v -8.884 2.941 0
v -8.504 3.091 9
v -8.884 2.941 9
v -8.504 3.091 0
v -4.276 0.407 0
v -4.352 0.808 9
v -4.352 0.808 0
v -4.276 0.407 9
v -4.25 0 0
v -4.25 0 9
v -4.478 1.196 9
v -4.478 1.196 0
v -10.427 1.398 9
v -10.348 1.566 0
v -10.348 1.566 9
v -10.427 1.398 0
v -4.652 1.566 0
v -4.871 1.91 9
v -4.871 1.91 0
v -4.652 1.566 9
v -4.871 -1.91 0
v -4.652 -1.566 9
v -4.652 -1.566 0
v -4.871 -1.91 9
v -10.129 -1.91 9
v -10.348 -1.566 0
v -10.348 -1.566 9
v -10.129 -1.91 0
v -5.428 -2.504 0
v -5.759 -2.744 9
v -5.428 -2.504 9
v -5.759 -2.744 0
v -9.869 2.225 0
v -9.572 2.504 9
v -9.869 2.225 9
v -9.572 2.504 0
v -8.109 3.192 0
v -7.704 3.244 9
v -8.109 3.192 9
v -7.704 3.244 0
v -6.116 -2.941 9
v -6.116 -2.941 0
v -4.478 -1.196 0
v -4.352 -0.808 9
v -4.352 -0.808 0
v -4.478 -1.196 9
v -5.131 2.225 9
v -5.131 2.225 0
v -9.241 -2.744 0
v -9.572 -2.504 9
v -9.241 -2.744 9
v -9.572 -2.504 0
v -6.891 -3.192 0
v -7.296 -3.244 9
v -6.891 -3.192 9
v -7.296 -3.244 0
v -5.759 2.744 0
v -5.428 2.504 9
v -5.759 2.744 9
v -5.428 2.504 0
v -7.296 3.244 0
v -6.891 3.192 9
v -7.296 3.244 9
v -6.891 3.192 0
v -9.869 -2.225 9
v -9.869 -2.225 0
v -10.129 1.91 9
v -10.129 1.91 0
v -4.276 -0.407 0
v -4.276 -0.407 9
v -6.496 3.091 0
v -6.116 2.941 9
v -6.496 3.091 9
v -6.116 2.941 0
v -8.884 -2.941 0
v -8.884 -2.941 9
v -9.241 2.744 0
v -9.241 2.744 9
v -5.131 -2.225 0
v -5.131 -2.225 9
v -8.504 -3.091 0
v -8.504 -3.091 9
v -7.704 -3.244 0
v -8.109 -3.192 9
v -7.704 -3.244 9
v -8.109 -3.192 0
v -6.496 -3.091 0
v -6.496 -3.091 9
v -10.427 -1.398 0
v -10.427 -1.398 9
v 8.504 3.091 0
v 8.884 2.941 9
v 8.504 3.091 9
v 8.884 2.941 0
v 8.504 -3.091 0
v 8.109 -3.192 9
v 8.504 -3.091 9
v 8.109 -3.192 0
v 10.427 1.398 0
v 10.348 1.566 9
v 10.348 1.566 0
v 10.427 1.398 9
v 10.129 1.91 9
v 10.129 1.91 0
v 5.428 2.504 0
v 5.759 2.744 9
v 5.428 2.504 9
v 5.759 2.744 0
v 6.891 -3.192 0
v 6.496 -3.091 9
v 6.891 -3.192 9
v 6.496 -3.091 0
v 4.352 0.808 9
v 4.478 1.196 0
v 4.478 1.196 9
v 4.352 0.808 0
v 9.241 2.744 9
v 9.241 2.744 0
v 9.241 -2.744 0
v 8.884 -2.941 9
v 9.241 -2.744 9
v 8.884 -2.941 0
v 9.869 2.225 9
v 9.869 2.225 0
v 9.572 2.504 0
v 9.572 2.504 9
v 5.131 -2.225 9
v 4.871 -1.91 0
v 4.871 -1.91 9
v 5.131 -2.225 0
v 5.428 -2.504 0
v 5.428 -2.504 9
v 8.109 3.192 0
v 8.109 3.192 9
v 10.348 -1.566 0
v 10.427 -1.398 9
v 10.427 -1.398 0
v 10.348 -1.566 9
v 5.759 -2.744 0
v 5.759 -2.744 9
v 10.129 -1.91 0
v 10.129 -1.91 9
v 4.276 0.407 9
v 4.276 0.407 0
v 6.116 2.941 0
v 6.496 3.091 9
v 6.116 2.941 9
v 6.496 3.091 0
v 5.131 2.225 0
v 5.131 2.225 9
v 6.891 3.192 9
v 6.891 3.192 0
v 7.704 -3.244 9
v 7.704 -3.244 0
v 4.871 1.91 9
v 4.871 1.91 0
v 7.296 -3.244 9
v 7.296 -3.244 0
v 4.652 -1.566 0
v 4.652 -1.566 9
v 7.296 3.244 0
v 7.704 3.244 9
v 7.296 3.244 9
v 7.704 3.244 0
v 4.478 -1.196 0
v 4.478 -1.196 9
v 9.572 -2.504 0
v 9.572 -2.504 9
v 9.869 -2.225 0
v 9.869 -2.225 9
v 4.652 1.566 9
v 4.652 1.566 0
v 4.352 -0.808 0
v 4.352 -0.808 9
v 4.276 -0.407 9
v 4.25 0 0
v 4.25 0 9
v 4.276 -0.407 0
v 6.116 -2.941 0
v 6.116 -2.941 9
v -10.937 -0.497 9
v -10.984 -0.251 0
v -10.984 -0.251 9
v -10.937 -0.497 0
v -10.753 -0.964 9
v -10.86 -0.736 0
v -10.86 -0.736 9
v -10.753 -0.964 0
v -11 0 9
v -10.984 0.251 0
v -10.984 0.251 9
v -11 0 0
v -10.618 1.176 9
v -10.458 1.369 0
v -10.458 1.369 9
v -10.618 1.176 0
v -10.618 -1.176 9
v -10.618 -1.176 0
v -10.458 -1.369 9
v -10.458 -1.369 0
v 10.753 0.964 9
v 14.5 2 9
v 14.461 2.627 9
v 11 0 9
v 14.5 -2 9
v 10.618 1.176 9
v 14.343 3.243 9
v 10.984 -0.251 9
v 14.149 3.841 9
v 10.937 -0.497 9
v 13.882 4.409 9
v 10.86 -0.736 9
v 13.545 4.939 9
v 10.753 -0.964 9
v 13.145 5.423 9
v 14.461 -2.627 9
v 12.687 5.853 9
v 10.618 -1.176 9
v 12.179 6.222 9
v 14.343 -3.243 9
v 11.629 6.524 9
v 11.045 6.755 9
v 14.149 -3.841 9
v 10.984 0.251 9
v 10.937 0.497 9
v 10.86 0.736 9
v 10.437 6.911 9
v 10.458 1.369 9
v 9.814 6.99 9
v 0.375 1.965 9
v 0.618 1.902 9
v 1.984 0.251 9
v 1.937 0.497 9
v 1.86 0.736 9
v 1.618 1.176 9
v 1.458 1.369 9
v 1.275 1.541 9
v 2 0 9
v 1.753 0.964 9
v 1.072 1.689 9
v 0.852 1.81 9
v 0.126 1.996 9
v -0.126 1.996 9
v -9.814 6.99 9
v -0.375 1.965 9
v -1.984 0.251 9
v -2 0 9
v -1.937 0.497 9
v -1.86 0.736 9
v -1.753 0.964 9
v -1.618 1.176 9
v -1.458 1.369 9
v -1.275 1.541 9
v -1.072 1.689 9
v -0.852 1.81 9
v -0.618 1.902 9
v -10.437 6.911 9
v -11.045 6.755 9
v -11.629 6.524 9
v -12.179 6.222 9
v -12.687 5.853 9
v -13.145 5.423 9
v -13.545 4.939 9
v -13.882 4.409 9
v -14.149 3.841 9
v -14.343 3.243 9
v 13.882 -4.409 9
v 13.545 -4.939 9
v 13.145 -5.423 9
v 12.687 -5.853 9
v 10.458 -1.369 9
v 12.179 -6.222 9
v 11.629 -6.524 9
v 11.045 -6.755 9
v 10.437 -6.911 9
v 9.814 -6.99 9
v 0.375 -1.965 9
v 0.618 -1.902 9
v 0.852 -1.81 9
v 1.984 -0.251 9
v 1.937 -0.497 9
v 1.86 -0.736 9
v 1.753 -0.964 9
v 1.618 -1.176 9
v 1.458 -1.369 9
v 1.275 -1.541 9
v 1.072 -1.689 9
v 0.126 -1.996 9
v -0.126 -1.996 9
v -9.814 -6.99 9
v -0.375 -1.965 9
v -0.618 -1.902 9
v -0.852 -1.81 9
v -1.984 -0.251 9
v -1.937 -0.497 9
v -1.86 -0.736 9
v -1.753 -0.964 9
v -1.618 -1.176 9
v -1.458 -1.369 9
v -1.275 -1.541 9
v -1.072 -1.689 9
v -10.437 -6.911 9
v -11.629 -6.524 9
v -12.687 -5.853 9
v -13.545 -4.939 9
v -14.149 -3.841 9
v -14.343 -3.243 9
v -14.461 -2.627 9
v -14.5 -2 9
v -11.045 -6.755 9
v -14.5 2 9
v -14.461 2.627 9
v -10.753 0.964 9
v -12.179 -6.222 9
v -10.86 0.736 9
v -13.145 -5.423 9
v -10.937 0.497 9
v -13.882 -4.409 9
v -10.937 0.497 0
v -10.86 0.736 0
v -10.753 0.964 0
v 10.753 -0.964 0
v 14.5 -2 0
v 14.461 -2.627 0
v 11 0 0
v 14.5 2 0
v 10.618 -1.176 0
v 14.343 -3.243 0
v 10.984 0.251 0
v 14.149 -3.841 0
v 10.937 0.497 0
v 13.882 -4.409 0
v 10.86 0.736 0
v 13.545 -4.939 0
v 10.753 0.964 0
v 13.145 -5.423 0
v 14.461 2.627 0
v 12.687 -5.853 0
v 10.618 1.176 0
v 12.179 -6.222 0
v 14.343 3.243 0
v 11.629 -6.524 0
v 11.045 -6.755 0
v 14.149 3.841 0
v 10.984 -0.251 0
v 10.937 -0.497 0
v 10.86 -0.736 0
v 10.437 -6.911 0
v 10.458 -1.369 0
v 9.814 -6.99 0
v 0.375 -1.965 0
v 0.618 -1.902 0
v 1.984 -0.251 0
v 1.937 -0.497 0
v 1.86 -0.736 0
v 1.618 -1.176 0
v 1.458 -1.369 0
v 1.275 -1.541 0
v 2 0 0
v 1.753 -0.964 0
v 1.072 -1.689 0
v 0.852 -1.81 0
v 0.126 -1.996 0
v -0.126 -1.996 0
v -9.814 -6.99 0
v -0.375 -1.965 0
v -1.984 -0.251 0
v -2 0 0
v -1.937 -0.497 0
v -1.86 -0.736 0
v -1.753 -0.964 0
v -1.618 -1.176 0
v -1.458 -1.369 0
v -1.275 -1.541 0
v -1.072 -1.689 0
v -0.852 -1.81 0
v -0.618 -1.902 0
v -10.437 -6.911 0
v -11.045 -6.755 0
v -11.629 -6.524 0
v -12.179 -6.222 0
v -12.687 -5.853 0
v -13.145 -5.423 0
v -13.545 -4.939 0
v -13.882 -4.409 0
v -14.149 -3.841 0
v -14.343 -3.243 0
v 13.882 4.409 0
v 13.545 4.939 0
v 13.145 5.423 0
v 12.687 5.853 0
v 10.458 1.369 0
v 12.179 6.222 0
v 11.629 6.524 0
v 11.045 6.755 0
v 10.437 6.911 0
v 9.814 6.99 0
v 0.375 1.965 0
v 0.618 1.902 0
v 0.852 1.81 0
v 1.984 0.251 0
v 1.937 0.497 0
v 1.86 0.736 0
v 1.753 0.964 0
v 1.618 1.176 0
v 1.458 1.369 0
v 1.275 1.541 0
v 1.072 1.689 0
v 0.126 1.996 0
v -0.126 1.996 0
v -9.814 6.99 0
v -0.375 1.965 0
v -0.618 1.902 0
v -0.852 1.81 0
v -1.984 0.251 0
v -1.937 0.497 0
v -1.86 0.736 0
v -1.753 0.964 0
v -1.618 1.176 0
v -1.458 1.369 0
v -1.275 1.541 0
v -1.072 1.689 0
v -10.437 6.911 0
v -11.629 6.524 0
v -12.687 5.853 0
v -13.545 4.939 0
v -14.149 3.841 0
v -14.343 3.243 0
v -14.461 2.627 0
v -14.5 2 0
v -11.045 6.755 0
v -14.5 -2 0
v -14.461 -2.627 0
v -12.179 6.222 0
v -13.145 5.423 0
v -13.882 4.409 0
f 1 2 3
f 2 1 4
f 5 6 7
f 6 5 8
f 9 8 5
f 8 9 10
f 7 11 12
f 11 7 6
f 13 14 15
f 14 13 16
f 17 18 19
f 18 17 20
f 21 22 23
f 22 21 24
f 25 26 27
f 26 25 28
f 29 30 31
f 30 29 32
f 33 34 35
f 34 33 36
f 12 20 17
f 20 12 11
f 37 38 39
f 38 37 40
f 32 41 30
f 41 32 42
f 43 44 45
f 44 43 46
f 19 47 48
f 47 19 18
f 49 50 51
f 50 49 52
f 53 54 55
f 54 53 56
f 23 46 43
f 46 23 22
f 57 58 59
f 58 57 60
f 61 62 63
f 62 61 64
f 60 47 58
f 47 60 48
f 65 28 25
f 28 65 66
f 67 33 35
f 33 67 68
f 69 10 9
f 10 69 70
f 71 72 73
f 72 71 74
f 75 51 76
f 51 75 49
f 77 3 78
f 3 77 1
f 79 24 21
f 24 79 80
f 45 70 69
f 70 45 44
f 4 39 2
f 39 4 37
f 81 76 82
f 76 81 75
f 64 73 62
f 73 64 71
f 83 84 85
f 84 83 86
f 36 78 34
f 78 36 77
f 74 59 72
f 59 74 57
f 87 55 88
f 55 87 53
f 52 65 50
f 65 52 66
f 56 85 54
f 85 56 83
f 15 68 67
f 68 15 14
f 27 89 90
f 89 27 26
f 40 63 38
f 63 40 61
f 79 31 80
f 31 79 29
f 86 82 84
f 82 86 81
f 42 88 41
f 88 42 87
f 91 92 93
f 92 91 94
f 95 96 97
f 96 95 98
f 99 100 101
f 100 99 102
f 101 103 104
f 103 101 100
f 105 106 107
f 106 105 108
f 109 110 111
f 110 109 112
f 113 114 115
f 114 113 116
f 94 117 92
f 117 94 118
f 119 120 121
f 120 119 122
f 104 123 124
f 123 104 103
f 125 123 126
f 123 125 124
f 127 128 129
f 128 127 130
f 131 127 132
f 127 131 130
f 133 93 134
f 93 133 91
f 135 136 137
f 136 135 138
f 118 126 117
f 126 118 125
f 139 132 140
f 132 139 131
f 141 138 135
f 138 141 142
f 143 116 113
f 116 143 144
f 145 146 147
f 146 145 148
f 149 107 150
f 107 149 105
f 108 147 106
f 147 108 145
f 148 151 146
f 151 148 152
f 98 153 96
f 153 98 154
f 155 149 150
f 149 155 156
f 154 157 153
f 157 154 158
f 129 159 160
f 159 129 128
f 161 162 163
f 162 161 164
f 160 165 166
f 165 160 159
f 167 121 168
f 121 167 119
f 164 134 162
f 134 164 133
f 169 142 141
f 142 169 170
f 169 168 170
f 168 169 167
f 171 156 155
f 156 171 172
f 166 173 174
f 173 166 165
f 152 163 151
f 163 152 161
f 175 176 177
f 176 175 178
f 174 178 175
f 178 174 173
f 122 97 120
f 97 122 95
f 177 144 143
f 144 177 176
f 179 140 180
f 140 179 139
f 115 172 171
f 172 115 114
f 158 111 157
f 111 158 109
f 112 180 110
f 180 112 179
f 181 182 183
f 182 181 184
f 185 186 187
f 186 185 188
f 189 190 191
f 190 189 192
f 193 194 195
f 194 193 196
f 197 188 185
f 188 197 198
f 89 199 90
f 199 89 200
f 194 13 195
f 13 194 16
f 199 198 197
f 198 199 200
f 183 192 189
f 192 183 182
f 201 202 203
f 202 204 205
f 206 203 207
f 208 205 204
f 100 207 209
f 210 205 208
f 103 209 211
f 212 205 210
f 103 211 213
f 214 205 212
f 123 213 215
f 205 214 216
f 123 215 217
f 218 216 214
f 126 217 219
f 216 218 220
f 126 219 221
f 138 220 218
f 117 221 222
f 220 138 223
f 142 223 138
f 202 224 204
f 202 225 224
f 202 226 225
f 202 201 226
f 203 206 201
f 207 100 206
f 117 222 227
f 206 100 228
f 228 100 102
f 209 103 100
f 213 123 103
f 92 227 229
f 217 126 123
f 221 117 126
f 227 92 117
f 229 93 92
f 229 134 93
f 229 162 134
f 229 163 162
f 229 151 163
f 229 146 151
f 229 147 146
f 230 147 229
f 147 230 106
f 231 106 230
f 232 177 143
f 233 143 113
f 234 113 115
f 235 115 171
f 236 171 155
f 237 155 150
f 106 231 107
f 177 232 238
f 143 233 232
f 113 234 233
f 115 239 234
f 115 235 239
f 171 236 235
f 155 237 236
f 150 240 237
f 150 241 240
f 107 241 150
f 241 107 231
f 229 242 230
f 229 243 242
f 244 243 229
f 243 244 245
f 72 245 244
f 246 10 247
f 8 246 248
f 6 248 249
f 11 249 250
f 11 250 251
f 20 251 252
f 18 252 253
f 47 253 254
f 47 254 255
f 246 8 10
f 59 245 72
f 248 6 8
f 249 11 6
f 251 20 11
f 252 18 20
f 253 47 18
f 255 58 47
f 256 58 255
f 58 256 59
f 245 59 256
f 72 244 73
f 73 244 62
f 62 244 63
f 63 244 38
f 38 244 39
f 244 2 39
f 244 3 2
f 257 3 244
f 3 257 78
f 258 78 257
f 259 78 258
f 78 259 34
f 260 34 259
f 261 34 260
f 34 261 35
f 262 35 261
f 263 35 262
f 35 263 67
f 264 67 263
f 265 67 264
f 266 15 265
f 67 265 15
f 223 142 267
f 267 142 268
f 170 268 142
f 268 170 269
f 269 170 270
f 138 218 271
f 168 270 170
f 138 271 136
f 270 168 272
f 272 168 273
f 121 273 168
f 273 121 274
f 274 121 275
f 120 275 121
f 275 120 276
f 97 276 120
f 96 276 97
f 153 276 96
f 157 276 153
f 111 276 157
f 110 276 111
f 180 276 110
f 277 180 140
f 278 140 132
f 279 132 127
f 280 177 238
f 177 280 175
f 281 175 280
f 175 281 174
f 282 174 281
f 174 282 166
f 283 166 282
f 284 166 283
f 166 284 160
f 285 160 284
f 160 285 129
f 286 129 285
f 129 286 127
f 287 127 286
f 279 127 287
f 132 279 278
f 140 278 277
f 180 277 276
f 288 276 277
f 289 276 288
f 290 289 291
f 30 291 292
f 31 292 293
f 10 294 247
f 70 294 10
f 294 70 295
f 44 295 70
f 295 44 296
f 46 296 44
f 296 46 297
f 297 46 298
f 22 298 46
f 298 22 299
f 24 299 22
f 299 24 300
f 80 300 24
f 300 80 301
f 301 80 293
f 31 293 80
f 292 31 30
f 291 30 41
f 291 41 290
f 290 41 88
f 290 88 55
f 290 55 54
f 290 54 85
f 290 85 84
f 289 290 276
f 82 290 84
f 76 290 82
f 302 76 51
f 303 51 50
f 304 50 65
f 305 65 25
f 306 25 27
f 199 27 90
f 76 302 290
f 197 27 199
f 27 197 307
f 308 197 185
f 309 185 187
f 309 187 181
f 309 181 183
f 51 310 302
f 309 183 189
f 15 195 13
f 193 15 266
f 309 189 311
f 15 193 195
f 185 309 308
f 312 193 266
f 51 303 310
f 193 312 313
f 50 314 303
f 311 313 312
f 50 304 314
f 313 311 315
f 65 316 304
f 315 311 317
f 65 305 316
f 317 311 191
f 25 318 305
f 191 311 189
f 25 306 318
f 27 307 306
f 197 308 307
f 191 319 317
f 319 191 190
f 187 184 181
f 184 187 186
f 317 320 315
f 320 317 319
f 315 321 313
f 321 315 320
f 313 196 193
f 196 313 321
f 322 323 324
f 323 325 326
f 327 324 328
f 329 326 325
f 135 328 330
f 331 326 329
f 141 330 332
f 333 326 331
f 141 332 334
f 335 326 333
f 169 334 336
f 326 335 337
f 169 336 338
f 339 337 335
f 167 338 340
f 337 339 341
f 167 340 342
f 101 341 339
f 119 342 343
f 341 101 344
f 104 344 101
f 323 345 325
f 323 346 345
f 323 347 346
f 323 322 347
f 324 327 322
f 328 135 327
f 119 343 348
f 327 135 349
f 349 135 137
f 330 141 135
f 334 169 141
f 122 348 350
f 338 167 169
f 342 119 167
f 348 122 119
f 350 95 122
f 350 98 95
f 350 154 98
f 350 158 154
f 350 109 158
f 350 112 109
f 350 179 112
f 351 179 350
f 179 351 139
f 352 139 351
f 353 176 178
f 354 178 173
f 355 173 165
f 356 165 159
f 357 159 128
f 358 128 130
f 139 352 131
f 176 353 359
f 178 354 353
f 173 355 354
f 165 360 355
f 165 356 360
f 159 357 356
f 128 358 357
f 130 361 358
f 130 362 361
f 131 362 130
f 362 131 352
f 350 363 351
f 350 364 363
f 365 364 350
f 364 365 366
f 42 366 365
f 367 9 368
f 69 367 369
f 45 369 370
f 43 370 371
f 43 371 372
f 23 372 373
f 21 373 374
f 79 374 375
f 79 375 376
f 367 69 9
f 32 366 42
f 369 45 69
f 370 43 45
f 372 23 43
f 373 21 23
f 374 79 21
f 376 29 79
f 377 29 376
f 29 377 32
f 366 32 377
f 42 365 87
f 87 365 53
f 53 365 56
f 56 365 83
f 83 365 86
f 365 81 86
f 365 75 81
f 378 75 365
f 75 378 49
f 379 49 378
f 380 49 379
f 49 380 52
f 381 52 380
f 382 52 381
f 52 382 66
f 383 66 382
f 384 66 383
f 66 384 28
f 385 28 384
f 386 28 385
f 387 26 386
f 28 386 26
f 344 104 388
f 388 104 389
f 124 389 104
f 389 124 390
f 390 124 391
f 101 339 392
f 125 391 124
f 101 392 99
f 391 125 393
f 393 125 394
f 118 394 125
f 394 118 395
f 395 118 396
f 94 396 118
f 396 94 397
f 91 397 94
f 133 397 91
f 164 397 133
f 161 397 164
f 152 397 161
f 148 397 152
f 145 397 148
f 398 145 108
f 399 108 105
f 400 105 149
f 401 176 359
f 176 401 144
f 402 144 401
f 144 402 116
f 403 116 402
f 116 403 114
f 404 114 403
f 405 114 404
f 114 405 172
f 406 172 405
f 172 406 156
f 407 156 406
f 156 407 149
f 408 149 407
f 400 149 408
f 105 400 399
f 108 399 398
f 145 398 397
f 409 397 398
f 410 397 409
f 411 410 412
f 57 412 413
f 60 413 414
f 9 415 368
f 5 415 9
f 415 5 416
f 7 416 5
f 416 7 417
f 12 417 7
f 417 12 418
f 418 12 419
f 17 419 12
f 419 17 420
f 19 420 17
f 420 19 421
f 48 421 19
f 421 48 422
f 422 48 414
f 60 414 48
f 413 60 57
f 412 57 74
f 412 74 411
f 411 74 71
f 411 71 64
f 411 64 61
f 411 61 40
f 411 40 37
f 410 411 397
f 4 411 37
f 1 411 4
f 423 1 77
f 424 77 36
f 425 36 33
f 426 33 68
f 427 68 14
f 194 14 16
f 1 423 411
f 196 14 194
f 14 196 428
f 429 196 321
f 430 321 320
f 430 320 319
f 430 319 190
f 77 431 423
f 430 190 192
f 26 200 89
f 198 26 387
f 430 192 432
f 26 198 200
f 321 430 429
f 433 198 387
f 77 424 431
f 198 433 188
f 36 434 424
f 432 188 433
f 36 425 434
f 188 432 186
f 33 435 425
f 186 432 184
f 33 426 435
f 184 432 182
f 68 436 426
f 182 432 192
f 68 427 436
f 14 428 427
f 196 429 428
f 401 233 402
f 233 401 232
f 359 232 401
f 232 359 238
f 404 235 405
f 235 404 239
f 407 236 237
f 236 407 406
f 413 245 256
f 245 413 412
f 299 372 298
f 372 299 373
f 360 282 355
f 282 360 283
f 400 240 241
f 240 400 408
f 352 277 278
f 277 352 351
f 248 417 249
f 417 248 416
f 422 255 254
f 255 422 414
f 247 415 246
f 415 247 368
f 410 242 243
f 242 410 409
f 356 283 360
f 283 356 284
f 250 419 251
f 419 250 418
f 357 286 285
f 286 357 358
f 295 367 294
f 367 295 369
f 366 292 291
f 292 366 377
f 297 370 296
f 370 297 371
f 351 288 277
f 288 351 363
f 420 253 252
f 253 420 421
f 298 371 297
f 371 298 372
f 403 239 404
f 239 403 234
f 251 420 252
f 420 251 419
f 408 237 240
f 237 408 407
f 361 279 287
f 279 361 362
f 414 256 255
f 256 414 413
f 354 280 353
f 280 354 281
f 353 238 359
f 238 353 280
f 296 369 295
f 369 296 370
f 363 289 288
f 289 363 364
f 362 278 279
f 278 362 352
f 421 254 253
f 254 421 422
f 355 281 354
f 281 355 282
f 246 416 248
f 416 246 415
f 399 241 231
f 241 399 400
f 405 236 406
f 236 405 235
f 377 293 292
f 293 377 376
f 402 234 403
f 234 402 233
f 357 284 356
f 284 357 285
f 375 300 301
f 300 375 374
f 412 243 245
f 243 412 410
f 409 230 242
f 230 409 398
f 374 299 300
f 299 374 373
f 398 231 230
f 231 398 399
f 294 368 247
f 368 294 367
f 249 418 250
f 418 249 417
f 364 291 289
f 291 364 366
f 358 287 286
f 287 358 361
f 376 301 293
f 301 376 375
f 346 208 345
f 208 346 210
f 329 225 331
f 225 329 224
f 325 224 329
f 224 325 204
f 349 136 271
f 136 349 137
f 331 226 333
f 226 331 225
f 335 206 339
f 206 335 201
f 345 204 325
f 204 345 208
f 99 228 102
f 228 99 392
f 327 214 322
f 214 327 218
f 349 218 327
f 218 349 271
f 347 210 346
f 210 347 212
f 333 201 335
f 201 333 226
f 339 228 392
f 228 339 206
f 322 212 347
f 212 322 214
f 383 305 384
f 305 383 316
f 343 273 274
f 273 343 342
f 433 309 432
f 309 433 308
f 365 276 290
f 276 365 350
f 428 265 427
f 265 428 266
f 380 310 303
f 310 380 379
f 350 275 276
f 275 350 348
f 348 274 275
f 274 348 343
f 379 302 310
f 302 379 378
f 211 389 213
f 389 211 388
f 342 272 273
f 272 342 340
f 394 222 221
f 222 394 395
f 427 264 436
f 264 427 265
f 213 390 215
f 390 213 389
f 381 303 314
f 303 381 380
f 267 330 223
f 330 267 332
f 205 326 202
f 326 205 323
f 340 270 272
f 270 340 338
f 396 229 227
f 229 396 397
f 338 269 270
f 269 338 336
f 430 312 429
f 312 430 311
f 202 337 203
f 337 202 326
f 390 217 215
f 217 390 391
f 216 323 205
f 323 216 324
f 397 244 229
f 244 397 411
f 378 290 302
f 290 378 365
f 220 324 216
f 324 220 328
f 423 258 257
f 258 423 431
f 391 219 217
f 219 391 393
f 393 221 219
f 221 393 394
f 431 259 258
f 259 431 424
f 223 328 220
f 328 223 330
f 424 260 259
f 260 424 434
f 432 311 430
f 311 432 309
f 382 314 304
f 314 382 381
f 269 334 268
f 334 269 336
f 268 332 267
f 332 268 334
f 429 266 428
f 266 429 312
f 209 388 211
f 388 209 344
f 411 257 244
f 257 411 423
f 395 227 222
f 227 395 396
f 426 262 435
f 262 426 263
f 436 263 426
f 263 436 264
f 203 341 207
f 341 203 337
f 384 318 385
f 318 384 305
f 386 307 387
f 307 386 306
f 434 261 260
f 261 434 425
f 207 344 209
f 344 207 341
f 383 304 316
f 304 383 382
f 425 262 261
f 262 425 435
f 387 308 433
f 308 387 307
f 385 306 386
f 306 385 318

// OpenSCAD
$fn = 50;


difference() {
	union() {
		hull() {
			translate(v = [-9.5000000000, 2.0000000000, 0]) {
				cylinder(h = 9, r = 5);
			}
			translate(v = [9.5000000000, 2.0000000000, 0]) {
				cylinder(h = 9, r = 5);
			}
			translate(v = [-9.5000000000, -2.0000000000, 0]) {
				cylinder(h = 9, r = 5);
			}
			translate(v = [9.5000000000, -2.0000000000, 0]) {
				cylinder(h = 9, r = 5);
			}
		}
	}
	union() {
		#translate(v = [-7.5000000000, 0.0000000000, -100.0000000000]) {
			cylinder(h = 200, r = 3.2500000000);
		}
		#translate(v = [-7.5000000000, 0.0000000000, -100.0000000000]) {
			cylinder(h = 200, r = 3.2500000000);
		}
		#translate(v = [7.5000000000, 0.0000000000, -100.0000000000]) {
			cylinder(h = 200, r = 3.2500000000);
		}
		#translate(v = [7.5000000000, 0.0000000000, -100.0000000000]) {
			cylinder(h = 200, r = 3.2500000000);
		}
		#translate(v = [-9.0000000000, 0, 0]) {
			cylinder(h = 9, r = 2.0000000000);
		}
		#cylinder(h = 9, r = 2.0000000000);
		#translate(v = [9.0000000000, 0, 0]) {
			cylinder(h = 9, r = 2.0000000000);
		}
	}
}
